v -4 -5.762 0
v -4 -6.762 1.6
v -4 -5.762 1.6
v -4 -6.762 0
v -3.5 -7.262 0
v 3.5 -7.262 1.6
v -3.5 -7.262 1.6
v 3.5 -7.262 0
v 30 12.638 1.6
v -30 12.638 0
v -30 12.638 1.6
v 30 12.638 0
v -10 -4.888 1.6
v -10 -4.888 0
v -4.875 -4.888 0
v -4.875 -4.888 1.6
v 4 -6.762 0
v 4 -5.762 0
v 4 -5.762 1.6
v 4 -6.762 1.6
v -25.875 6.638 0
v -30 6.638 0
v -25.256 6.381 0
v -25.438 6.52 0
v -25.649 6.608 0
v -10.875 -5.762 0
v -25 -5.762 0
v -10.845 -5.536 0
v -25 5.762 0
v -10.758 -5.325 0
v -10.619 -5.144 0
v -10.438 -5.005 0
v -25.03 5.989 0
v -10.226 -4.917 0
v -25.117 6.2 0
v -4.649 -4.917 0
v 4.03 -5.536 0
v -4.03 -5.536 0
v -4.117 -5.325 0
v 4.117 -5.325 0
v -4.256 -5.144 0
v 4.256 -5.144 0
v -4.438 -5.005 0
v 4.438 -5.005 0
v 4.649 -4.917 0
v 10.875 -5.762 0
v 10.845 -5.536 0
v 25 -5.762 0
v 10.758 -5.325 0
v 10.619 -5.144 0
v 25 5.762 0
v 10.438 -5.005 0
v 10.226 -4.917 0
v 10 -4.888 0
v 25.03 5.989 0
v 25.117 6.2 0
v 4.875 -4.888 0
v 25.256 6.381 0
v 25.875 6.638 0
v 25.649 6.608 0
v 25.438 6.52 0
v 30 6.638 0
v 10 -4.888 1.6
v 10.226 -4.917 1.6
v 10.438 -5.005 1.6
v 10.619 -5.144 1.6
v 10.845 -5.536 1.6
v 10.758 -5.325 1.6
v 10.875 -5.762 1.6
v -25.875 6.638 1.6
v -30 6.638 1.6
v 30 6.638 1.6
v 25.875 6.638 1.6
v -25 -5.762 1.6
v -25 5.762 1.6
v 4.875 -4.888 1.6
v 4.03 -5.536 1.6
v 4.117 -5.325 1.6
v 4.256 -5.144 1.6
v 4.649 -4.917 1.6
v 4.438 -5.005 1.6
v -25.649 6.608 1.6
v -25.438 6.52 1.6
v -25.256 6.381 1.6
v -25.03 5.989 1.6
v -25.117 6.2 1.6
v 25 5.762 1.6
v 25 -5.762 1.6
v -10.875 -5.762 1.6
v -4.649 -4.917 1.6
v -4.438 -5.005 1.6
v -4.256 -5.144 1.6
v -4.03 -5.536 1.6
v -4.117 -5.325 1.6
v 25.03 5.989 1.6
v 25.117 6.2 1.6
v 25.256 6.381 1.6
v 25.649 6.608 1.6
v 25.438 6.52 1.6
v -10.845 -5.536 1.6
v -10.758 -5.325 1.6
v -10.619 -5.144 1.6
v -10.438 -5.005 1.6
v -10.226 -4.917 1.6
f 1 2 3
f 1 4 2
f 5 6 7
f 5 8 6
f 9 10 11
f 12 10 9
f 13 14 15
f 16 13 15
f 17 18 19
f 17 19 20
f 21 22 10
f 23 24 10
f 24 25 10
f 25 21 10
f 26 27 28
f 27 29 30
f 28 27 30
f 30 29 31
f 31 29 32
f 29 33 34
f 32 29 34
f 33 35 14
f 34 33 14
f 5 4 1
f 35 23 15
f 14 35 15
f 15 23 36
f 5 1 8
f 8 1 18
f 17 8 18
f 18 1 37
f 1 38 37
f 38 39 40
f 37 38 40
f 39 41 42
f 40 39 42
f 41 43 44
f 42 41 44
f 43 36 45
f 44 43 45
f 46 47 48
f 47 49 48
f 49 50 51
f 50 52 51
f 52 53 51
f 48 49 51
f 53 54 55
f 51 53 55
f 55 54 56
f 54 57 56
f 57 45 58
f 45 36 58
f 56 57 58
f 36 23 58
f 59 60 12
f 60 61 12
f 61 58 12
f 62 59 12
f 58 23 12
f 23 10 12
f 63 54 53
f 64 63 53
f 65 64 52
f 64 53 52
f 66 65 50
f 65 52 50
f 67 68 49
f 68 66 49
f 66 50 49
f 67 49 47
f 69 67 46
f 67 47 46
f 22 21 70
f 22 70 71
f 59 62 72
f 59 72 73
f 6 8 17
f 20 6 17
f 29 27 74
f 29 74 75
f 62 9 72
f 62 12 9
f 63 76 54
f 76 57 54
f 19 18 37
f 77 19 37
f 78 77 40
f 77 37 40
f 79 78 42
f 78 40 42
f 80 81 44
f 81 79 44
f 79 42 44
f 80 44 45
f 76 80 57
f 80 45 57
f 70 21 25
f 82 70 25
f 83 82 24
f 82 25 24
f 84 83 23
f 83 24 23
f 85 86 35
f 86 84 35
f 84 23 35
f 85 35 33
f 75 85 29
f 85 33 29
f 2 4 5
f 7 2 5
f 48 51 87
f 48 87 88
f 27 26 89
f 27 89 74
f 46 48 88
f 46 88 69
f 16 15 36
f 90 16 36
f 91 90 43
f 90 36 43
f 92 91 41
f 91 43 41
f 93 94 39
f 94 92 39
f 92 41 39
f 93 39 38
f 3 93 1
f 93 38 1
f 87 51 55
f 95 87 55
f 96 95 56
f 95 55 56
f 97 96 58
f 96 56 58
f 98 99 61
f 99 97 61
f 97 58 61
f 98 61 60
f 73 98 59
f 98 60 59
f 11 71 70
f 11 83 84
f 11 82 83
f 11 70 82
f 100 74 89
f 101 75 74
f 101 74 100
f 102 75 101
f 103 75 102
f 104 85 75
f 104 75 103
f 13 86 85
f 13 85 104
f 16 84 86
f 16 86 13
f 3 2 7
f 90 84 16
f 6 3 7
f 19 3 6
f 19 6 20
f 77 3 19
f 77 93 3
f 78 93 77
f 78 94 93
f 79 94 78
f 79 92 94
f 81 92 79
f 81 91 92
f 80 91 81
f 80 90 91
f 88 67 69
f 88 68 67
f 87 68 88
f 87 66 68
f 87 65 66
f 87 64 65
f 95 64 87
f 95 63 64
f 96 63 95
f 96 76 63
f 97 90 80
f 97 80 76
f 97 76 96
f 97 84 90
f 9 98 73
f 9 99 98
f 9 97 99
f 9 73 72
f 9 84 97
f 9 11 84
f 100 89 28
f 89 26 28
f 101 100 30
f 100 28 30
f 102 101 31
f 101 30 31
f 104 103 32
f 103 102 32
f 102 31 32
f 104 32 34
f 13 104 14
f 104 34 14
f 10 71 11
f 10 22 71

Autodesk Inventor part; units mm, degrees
ref_plane "YZ Plane" through (0, 0, 0) normal (1, 0, 0) x (0, 1, 0)
ref_plane "XZ Plane" through (0, 0, 0) normal (0, 1, 0) x (-1, 0, 0)
ref_plane "XY Plane" through (0, 0, 0) normal (0, 0, 1) x (1, 0, 0)
sketch "Sketch1" plane through (0, 0, 0) normal (0, 0, 1) x (1, 0, 0)
  line L0 (-30, 12.6375) -> (30, 12.6375)
  line L1 (30, 12.6375) -> (30, 6.6375)
  line L2 (30, 6.6375) -> (25.875, 6.6375)
  line L3 (25, 5.7625) -> (25, -5.7625)
  line L4 (25, -5.7625) -> (10.875, -5.7625)
  line L5 (4, -5.7625) -> (4, -6.7625)
  line L6 (3.5, -7.2625) -> (-3.5, -7.2625)
  line L7 (-4, -6.7625) -> (-4, -5.7625)
  line L8 (-10.875, -5.7625) -> (-25, -5.7625)
  line L9 (-25, -5.7625) -> (-25, 5.7625)
  line L10 (-25.875, 6.6375) -> (-30, 6.6375)
  line L11 (-30, 6.6375) -> (-30, 12.6375)
  arc A0 (-4, -5.7625) -> (-4.875, -4.8875) centre (-4.875, -5.7625) ccw
  arc A1 (4.875, -4.8875) -> (4, -5.7625) centre (4.875, -5.7625) ccw
  arc A2 (-25, 5.7625) -> (-25.875, 6.6375) centre (-25.875, 5.7625) ccw
  arc A3 (25.875, 6.6375) -> (25, 5.7625) centre (25.875, 5.7625) ccw
  line L12 (0, 4.2796) -> (0, -4.2796) construction
  line L13 (-9.9053, 0) -> (11.8635, 0) construction
  line L14 (-4, -6.7625) -> (-3.5, -7.2625)
  line L15 (3.5, -7.2625) -> (4, -6.7625)
  arc A4 (-10, -4.8875) -> (-10.875, -5.7625) centre (-10, -5.7625) ccw
  arc A5 (10.875, -5.7625) -> (10, -4.8875) centre (10, -5.7625) ccw
  line L16 (-10, -4.8875) -> (-4.875, -4.8875)
  line L17 (4.875, -4.8875) -> (10, -4.8875)
  point P0 (0, 0)
  point P1 (0, 12.6375)
  point P2 (-25, 0)
  dimension "d0" = 1.75
  dimension "d3" = 1.5
  dimension "d5" = 6
  dimension "d6" = 5
  dimension "d11" = 25
  dimension "d12" = 45
  dimension "d13" = 0.5
  dimension "d14" = 8
  dimension "d16" = 18.4
  dimension "d17" = 6
extrude "Extrusion1" add sketch "Sketch1" along normal blind 1.6
sketch "Sketch2" plane through (0, 0, 1.6) normal (0, 0, 1) x (1, 0, 0)
  line L0 (30, 12.6375) -> (-30, 12.6375) projected
  point P0 (0, 0)
  point P1 (-16, 2.1375)
  point P2 (0, 2.1375)
  point P3 (16, 2.1375)
  dimension "d9" = 16
  dimension "d10" = 16
  dimension "d15" = 10.5
equation "\"d10\" = d9"
properties part number "AK-C-C39-Insert-Board"
